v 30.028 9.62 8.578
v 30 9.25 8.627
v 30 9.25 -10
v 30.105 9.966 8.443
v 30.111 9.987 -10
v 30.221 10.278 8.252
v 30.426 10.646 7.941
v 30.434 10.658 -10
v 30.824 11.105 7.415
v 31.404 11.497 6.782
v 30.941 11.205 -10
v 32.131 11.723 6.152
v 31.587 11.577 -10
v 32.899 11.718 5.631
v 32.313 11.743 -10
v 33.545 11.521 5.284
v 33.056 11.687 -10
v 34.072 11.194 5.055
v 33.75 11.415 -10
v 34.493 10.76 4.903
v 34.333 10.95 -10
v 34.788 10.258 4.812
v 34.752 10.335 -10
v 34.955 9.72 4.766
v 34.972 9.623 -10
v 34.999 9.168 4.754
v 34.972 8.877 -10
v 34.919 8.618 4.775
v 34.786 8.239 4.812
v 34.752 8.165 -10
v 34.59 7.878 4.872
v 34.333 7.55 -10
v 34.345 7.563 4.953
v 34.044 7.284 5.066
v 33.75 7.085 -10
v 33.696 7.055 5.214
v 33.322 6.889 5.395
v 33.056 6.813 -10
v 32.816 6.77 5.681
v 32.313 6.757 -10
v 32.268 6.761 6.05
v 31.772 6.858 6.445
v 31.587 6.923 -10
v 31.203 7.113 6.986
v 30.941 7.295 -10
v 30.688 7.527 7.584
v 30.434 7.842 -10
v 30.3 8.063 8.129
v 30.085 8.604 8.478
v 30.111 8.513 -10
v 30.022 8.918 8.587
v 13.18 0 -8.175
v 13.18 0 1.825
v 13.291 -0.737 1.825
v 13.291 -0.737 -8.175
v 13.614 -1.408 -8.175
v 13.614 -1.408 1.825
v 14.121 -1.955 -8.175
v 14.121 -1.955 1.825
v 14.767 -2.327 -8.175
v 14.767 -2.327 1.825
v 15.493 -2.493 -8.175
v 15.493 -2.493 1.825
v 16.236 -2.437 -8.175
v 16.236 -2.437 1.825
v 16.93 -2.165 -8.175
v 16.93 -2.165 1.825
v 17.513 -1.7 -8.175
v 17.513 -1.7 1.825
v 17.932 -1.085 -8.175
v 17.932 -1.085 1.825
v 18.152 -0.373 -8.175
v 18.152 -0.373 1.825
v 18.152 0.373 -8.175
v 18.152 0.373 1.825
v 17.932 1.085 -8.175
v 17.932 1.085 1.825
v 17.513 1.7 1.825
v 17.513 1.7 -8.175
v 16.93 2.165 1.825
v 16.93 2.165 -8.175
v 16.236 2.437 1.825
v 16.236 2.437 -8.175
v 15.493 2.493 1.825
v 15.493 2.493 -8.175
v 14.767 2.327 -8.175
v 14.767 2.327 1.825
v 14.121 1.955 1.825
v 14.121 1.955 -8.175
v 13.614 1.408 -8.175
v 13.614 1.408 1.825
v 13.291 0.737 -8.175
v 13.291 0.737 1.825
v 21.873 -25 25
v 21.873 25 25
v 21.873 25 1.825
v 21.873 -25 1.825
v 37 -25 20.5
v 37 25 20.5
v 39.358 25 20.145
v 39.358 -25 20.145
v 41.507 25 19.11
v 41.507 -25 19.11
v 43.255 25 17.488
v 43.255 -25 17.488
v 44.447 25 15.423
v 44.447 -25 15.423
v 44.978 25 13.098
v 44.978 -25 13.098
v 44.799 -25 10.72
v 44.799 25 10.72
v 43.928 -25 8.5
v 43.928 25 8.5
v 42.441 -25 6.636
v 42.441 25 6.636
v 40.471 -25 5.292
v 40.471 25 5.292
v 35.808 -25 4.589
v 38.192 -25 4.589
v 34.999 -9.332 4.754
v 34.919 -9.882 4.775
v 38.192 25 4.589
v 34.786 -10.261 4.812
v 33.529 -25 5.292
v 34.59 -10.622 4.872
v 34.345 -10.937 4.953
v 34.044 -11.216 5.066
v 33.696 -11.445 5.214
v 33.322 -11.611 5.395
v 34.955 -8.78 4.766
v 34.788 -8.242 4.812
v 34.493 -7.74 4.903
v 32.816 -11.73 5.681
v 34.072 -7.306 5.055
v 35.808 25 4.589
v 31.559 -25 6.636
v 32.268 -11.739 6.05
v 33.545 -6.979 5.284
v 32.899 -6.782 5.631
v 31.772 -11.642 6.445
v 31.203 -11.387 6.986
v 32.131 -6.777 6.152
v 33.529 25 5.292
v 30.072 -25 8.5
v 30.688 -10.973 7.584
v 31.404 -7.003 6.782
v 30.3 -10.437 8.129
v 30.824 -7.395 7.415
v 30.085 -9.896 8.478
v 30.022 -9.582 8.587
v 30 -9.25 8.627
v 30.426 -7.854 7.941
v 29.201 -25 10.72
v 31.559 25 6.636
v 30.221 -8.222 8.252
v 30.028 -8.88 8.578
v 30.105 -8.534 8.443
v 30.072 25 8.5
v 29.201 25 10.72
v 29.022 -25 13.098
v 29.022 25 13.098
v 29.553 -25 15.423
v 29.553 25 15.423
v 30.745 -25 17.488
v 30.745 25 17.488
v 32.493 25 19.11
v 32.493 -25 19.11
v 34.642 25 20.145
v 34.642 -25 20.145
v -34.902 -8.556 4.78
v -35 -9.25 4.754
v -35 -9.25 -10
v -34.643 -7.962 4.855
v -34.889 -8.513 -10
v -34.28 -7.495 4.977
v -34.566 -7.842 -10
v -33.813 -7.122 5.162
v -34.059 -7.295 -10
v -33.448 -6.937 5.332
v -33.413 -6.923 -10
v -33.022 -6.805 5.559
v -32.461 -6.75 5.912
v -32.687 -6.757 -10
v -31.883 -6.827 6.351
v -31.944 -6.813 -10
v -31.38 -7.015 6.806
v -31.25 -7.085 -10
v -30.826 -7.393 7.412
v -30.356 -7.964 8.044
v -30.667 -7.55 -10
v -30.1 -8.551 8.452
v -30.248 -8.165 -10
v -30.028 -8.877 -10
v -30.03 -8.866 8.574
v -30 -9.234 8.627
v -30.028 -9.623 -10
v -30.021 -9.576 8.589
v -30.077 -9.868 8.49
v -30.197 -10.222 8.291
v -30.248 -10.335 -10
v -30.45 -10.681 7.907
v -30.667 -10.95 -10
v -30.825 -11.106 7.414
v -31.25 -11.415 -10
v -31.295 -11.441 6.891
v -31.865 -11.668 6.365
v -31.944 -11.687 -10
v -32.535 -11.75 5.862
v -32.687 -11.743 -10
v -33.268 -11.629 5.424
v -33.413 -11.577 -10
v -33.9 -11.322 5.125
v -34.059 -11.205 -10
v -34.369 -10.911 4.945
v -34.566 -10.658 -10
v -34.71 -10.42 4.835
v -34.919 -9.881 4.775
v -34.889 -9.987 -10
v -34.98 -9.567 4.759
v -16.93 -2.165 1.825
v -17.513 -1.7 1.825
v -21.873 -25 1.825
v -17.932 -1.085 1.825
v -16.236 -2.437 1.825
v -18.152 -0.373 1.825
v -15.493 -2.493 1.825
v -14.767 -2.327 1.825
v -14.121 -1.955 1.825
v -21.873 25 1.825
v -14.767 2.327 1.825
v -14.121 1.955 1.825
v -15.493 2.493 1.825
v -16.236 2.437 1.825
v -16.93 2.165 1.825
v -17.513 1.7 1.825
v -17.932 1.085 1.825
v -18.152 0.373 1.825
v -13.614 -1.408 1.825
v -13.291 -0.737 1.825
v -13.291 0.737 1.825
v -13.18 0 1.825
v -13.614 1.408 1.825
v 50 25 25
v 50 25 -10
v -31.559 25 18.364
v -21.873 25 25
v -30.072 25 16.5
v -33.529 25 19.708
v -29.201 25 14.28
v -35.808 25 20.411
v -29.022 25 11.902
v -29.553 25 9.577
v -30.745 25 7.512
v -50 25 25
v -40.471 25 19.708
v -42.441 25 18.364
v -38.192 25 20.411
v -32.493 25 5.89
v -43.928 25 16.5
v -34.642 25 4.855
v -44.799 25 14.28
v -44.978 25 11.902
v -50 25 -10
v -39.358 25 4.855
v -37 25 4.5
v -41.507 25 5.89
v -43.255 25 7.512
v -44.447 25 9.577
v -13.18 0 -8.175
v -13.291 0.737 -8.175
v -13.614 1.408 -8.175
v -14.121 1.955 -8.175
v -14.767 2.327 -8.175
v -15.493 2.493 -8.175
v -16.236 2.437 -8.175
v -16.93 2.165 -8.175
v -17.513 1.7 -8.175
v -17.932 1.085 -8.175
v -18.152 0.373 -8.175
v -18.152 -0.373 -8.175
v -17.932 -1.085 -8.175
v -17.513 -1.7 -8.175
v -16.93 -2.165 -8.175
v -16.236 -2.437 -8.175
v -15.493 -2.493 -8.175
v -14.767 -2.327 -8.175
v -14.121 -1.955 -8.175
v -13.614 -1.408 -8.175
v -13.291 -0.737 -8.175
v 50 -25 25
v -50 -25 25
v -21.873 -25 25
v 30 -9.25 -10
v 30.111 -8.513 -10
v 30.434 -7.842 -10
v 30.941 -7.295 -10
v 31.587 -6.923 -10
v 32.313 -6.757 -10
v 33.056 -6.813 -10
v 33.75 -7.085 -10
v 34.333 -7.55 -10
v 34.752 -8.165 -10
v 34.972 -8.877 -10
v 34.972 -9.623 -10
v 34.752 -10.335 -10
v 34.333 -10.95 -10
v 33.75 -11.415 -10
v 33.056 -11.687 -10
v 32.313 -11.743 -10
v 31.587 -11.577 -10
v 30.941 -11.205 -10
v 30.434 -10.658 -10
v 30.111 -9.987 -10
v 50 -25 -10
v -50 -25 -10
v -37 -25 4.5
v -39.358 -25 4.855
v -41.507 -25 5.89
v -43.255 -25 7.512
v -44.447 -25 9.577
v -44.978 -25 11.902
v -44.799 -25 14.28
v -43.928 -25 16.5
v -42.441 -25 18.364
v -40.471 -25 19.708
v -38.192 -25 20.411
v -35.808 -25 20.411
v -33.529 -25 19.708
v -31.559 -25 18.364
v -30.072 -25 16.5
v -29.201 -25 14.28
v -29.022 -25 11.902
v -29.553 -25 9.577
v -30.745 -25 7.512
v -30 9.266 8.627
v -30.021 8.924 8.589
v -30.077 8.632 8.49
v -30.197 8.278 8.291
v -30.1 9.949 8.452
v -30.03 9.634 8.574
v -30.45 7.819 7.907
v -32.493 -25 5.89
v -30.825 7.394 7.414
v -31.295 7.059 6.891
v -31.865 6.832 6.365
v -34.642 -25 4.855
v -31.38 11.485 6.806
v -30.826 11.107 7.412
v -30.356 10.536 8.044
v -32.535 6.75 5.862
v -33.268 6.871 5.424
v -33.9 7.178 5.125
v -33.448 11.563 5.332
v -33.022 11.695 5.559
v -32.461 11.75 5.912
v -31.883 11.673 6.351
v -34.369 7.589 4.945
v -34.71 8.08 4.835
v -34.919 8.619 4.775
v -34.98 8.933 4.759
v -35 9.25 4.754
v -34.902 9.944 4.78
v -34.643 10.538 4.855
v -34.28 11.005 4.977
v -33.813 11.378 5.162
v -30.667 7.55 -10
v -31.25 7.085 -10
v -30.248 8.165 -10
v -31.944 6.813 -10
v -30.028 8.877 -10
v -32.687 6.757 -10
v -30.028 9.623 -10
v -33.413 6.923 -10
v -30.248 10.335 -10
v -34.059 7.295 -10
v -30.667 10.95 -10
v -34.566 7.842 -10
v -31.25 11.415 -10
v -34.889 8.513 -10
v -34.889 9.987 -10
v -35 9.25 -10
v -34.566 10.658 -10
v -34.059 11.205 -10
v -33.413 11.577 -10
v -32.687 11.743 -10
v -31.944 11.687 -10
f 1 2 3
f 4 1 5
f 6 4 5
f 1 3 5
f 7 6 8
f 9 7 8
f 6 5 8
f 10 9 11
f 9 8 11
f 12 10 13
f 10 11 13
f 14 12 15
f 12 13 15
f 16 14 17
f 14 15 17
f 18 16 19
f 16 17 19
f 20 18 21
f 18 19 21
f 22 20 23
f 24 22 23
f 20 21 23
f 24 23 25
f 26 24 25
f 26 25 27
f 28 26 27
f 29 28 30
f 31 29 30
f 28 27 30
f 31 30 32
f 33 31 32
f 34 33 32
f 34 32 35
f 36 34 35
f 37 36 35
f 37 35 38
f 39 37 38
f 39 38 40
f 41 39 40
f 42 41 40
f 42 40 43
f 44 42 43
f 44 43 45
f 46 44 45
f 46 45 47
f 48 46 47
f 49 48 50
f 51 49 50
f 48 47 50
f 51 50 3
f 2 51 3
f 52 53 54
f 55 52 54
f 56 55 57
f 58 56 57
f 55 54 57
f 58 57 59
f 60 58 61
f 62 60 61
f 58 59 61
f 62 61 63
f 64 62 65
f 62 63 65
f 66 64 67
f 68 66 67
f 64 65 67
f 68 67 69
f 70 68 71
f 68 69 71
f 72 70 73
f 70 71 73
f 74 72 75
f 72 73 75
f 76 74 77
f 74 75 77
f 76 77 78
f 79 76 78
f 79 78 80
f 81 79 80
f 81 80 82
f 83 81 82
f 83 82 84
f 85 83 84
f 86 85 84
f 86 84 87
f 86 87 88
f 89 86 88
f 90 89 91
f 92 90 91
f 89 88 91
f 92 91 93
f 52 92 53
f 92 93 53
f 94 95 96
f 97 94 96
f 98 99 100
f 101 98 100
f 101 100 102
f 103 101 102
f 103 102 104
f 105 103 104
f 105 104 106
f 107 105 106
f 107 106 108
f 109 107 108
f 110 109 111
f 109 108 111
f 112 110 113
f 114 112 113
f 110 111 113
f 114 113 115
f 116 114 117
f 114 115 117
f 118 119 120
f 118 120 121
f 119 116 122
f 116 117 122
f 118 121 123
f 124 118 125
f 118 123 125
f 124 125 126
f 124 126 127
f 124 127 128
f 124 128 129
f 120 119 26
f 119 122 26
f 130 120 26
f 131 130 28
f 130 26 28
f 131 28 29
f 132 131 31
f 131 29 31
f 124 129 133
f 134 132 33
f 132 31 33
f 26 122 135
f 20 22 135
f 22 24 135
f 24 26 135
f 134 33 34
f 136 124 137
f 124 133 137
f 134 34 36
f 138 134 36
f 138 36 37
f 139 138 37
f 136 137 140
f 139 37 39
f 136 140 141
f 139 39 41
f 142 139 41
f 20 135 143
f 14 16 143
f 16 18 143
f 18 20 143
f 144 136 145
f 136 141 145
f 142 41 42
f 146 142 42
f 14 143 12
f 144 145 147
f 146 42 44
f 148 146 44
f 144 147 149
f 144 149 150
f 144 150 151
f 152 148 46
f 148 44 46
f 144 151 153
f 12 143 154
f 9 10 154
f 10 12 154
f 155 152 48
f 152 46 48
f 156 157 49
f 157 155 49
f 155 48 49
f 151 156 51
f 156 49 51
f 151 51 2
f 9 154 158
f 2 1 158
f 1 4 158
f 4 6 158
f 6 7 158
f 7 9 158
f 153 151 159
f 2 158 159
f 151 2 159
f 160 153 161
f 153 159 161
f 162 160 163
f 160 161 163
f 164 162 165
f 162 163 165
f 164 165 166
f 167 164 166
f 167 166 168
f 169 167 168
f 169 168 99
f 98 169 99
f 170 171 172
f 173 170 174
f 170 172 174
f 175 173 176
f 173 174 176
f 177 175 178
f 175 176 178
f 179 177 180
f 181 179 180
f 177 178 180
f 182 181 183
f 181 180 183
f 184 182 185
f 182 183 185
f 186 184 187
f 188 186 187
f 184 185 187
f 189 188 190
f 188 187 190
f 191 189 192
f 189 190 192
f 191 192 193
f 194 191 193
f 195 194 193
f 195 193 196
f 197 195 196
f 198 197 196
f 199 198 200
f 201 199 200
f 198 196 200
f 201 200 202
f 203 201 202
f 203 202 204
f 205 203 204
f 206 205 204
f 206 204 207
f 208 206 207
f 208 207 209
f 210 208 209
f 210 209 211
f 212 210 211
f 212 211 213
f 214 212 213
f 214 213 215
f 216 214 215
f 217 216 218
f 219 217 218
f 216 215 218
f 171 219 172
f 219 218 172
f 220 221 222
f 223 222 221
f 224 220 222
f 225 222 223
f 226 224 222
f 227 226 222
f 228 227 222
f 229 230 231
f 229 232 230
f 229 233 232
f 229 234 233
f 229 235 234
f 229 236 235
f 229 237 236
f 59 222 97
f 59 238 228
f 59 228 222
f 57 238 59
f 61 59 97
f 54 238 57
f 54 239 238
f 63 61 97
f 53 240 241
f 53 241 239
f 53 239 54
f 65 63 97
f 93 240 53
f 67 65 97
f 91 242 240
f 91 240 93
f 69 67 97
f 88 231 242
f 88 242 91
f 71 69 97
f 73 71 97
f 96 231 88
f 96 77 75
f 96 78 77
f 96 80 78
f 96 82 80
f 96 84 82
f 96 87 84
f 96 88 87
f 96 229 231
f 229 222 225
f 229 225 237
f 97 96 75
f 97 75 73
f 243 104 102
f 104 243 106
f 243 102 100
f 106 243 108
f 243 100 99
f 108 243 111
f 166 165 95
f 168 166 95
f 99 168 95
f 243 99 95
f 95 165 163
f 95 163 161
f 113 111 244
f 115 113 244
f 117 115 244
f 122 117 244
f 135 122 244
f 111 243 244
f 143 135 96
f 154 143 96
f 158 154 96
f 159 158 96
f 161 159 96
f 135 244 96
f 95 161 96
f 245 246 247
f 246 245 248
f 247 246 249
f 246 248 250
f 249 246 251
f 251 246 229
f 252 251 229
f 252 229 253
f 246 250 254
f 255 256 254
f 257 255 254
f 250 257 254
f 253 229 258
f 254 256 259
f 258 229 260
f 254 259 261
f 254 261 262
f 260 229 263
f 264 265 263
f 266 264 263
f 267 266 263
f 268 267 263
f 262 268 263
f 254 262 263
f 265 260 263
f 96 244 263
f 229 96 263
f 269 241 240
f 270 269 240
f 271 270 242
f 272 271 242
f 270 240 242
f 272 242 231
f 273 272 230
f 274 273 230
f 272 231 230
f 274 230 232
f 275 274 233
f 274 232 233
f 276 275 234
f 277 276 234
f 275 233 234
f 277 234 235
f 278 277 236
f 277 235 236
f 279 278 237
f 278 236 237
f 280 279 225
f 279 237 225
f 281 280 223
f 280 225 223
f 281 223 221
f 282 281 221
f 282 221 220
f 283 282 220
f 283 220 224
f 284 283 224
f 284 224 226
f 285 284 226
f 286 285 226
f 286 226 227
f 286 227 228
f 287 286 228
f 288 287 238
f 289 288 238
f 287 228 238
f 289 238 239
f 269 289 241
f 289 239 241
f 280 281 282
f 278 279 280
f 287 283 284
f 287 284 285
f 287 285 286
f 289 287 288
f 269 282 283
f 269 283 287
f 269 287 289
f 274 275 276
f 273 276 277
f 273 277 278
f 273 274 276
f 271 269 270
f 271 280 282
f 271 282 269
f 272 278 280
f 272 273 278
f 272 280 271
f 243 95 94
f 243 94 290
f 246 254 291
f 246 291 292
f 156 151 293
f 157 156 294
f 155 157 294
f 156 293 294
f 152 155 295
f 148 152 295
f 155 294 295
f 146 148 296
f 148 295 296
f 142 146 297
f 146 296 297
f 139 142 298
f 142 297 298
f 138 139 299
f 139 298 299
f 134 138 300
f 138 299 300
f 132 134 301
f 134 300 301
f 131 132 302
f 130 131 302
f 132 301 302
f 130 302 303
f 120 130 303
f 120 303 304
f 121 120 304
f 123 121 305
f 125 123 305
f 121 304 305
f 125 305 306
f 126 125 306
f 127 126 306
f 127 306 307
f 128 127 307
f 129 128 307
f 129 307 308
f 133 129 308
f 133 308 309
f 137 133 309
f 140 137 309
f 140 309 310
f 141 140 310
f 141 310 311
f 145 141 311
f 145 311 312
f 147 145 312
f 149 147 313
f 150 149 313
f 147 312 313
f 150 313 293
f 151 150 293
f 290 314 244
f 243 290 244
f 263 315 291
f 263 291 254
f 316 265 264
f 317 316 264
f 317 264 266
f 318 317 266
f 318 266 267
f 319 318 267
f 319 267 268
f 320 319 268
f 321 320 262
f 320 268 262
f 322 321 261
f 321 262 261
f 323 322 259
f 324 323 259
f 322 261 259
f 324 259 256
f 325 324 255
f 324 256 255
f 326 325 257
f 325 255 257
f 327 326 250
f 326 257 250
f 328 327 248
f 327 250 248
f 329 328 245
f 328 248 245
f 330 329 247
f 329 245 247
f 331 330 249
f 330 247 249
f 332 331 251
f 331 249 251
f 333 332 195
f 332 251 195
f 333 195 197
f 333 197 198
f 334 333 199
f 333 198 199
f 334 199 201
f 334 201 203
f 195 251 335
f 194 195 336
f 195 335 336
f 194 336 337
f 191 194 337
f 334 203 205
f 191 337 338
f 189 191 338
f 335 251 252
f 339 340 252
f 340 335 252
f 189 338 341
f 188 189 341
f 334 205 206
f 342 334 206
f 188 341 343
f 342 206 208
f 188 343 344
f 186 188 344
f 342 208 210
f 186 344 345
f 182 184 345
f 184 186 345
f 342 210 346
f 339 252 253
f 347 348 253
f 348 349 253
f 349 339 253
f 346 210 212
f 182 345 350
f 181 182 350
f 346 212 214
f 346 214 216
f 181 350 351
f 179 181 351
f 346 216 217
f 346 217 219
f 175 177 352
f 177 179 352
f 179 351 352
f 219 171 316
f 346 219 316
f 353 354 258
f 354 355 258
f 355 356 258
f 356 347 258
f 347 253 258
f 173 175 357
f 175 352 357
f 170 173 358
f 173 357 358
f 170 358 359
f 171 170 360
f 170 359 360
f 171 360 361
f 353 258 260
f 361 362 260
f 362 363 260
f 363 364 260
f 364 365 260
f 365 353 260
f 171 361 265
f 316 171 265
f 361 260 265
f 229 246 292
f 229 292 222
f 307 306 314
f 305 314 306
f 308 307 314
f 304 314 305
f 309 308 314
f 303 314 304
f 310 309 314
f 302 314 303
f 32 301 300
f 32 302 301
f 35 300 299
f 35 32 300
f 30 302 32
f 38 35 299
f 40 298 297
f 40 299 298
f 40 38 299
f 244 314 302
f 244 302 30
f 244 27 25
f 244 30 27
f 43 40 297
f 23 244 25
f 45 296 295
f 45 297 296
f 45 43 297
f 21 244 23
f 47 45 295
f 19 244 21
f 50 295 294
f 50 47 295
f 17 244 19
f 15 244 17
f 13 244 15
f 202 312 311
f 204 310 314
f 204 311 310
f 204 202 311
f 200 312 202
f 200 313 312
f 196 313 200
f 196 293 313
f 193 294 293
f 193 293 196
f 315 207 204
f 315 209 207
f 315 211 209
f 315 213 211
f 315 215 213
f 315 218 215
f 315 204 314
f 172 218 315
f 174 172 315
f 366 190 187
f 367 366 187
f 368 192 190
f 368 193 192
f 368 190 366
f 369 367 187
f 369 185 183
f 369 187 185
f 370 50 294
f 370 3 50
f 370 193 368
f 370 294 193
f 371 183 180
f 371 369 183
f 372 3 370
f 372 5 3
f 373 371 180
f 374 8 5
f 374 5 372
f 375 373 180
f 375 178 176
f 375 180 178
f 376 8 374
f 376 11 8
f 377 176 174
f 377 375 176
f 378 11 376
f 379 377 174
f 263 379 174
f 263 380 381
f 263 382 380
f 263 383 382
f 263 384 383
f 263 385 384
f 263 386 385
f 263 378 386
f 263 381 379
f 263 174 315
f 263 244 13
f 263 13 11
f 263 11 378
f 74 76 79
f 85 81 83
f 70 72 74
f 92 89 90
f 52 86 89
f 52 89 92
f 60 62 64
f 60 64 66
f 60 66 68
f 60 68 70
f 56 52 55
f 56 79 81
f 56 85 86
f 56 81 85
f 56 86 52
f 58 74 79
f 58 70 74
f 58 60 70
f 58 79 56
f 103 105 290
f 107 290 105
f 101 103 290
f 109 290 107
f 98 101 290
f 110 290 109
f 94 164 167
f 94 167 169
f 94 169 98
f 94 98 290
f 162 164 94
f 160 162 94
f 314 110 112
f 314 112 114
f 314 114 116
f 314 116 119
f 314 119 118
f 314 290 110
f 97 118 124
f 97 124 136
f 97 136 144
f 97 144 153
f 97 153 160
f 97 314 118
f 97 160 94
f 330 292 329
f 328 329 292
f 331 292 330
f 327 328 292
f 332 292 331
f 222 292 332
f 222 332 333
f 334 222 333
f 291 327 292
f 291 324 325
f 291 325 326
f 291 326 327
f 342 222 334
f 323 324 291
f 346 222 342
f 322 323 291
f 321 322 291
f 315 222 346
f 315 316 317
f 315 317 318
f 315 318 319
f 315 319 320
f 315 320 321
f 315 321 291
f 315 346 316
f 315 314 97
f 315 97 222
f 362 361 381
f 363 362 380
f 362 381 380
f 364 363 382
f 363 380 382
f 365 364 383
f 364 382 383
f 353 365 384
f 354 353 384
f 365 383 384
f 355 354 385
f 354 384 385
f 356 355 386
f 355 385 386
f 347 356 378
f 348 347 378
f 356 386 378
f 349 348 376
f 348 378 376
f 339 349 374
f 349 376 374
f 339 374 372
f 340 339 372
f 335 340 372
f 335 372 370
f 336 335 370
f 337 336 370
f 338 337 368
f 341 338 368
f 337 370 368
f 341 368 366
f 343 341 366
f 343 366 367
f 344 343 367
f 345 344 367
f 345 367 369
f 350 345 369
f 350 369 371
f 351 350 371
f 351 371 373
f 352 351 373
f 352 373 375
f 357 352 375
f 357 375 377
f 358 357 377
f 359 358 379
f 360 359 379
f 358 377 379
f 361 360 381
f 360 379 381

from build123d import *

# Parameters (mm, degrees)
SKETCH3_W           = 100
SKETCH3_H           = 50
BOSS_EXTRUDE1_DEPTH = 25
SKETCH5_R           = 8
SKETCH5_W           = 43.746020772
SKETCH5_H           = 23.175190528
CUT_EXTRUDE1_DEPTH  = 76
SKETCH7_R           = 2.5
CUT_EXTRUDE4_DEPTH  = 10
BOSS_EXTRUDE2_START = 10
SKETCH8_W           = 100
SKETCH8_H           = 50
SKETCH8_R           = 2.5
BOSS_EXTRUDE2_DEPTH = 10
SKETCH9_R           = 2.5
CUT_EXTRUDE5_DEPTH  = 10


with BuildPart() as part:
    # Sketch3 → Boss-Extrude1 (new body)
    with BuildSketch(Plane.XY):
        Rectangle(SKETCH3_W, SKETCH3_H)
    extrude(amount=BOSS_EXTRUDE1_DEPTH)

    # Sketch5 → Cut-Extrude1 (cut, through all)
    with BuildSketch(Plane(origin=(0, 25, 0), x_dir=(1, 0, 0), z_dir=(0, 1, 0))):
        with Locations(Location((37, -12.5, 0), (0, 0, 270))):
            Circle(SKETCH5_R)
        with Locations(Location((-37, -12.5, 0), (0, 0, 90))):
            Circle(SKETCH5_R)
        with Locations((0, -13.412404736)):
            Rectangle(SKETCH5_W, SKETCH5_H)
    extrude(amount=-CUT_EXTRUDE1_DEPTH, mode=Mode.SUBTRACT)

    # Sketch7 → Cut-Extrude4 (cut)
    with BuildSketch(Plane(origin=(0, 0, 0), x_dir=(-1, 0, 0), z_dir=(0, 0, -1))):
        with Locations((32.5, 9.25)):
            Circle(SKETCH7_R)
        with Locations((32.5, -9.25)):
            Circle(SKETCH7_R)
        with Locations((-32.5, -9.25)):
            Circle(SKETCH7_R)
        with Locations((-32.5, 9.25)):
            Circle(SKETCH7_R)
    extrude(amount=-CUT_EXTRUDE4_DEPTH, mode=Mode.SUBTRACT)

    # Sketch8 → Boss-Extrude2 (add)
    with BuildSketch(Plane(origin=(0, 0, 0), x_dir=(-1, 0, 0), z_dir=(0, 0, -1)).offset(BOSS_EXTRUDE2_START)):
        Rectangle(SKETCH8_W, SKETCH8_H)
        with Locations((-32.5, 9.25)):
            Circle(SKETCH8_R, mode=Mode.SUBTRACT)
        with Locations((-32.5, -9.25)):
            Circle(SKETCH8_R, mode=Mode.SUBTRACT)
        with Locations((32.5, -9.25)):
            Circle(SKETCH8_R, mode=Mode.SUBTRACT)
        with Locations((32.5, 9.25)):
            Circle(SKETCH8_R, mode=Mode.SUBTRACT)
    extrude(amount=-BOSS_EXTRUDE2_DEPTH)

    # Sketch9 → Cut-Extrude5 (cut)
    with BuildSketch(Plane.XY.offset(1.824809472)):
        with Locations((-15.68, 0)):
            Circle(SKETCH9_R)
        with Locations(Location((15.68, 0, 0), (0, 0, 180))):
            Circle(SKETCH9_R)
    extrude(amount=-CUT_EXTRUDE5_DEPTH, mode=Mode.SUBTRACT)


solid = part.part
